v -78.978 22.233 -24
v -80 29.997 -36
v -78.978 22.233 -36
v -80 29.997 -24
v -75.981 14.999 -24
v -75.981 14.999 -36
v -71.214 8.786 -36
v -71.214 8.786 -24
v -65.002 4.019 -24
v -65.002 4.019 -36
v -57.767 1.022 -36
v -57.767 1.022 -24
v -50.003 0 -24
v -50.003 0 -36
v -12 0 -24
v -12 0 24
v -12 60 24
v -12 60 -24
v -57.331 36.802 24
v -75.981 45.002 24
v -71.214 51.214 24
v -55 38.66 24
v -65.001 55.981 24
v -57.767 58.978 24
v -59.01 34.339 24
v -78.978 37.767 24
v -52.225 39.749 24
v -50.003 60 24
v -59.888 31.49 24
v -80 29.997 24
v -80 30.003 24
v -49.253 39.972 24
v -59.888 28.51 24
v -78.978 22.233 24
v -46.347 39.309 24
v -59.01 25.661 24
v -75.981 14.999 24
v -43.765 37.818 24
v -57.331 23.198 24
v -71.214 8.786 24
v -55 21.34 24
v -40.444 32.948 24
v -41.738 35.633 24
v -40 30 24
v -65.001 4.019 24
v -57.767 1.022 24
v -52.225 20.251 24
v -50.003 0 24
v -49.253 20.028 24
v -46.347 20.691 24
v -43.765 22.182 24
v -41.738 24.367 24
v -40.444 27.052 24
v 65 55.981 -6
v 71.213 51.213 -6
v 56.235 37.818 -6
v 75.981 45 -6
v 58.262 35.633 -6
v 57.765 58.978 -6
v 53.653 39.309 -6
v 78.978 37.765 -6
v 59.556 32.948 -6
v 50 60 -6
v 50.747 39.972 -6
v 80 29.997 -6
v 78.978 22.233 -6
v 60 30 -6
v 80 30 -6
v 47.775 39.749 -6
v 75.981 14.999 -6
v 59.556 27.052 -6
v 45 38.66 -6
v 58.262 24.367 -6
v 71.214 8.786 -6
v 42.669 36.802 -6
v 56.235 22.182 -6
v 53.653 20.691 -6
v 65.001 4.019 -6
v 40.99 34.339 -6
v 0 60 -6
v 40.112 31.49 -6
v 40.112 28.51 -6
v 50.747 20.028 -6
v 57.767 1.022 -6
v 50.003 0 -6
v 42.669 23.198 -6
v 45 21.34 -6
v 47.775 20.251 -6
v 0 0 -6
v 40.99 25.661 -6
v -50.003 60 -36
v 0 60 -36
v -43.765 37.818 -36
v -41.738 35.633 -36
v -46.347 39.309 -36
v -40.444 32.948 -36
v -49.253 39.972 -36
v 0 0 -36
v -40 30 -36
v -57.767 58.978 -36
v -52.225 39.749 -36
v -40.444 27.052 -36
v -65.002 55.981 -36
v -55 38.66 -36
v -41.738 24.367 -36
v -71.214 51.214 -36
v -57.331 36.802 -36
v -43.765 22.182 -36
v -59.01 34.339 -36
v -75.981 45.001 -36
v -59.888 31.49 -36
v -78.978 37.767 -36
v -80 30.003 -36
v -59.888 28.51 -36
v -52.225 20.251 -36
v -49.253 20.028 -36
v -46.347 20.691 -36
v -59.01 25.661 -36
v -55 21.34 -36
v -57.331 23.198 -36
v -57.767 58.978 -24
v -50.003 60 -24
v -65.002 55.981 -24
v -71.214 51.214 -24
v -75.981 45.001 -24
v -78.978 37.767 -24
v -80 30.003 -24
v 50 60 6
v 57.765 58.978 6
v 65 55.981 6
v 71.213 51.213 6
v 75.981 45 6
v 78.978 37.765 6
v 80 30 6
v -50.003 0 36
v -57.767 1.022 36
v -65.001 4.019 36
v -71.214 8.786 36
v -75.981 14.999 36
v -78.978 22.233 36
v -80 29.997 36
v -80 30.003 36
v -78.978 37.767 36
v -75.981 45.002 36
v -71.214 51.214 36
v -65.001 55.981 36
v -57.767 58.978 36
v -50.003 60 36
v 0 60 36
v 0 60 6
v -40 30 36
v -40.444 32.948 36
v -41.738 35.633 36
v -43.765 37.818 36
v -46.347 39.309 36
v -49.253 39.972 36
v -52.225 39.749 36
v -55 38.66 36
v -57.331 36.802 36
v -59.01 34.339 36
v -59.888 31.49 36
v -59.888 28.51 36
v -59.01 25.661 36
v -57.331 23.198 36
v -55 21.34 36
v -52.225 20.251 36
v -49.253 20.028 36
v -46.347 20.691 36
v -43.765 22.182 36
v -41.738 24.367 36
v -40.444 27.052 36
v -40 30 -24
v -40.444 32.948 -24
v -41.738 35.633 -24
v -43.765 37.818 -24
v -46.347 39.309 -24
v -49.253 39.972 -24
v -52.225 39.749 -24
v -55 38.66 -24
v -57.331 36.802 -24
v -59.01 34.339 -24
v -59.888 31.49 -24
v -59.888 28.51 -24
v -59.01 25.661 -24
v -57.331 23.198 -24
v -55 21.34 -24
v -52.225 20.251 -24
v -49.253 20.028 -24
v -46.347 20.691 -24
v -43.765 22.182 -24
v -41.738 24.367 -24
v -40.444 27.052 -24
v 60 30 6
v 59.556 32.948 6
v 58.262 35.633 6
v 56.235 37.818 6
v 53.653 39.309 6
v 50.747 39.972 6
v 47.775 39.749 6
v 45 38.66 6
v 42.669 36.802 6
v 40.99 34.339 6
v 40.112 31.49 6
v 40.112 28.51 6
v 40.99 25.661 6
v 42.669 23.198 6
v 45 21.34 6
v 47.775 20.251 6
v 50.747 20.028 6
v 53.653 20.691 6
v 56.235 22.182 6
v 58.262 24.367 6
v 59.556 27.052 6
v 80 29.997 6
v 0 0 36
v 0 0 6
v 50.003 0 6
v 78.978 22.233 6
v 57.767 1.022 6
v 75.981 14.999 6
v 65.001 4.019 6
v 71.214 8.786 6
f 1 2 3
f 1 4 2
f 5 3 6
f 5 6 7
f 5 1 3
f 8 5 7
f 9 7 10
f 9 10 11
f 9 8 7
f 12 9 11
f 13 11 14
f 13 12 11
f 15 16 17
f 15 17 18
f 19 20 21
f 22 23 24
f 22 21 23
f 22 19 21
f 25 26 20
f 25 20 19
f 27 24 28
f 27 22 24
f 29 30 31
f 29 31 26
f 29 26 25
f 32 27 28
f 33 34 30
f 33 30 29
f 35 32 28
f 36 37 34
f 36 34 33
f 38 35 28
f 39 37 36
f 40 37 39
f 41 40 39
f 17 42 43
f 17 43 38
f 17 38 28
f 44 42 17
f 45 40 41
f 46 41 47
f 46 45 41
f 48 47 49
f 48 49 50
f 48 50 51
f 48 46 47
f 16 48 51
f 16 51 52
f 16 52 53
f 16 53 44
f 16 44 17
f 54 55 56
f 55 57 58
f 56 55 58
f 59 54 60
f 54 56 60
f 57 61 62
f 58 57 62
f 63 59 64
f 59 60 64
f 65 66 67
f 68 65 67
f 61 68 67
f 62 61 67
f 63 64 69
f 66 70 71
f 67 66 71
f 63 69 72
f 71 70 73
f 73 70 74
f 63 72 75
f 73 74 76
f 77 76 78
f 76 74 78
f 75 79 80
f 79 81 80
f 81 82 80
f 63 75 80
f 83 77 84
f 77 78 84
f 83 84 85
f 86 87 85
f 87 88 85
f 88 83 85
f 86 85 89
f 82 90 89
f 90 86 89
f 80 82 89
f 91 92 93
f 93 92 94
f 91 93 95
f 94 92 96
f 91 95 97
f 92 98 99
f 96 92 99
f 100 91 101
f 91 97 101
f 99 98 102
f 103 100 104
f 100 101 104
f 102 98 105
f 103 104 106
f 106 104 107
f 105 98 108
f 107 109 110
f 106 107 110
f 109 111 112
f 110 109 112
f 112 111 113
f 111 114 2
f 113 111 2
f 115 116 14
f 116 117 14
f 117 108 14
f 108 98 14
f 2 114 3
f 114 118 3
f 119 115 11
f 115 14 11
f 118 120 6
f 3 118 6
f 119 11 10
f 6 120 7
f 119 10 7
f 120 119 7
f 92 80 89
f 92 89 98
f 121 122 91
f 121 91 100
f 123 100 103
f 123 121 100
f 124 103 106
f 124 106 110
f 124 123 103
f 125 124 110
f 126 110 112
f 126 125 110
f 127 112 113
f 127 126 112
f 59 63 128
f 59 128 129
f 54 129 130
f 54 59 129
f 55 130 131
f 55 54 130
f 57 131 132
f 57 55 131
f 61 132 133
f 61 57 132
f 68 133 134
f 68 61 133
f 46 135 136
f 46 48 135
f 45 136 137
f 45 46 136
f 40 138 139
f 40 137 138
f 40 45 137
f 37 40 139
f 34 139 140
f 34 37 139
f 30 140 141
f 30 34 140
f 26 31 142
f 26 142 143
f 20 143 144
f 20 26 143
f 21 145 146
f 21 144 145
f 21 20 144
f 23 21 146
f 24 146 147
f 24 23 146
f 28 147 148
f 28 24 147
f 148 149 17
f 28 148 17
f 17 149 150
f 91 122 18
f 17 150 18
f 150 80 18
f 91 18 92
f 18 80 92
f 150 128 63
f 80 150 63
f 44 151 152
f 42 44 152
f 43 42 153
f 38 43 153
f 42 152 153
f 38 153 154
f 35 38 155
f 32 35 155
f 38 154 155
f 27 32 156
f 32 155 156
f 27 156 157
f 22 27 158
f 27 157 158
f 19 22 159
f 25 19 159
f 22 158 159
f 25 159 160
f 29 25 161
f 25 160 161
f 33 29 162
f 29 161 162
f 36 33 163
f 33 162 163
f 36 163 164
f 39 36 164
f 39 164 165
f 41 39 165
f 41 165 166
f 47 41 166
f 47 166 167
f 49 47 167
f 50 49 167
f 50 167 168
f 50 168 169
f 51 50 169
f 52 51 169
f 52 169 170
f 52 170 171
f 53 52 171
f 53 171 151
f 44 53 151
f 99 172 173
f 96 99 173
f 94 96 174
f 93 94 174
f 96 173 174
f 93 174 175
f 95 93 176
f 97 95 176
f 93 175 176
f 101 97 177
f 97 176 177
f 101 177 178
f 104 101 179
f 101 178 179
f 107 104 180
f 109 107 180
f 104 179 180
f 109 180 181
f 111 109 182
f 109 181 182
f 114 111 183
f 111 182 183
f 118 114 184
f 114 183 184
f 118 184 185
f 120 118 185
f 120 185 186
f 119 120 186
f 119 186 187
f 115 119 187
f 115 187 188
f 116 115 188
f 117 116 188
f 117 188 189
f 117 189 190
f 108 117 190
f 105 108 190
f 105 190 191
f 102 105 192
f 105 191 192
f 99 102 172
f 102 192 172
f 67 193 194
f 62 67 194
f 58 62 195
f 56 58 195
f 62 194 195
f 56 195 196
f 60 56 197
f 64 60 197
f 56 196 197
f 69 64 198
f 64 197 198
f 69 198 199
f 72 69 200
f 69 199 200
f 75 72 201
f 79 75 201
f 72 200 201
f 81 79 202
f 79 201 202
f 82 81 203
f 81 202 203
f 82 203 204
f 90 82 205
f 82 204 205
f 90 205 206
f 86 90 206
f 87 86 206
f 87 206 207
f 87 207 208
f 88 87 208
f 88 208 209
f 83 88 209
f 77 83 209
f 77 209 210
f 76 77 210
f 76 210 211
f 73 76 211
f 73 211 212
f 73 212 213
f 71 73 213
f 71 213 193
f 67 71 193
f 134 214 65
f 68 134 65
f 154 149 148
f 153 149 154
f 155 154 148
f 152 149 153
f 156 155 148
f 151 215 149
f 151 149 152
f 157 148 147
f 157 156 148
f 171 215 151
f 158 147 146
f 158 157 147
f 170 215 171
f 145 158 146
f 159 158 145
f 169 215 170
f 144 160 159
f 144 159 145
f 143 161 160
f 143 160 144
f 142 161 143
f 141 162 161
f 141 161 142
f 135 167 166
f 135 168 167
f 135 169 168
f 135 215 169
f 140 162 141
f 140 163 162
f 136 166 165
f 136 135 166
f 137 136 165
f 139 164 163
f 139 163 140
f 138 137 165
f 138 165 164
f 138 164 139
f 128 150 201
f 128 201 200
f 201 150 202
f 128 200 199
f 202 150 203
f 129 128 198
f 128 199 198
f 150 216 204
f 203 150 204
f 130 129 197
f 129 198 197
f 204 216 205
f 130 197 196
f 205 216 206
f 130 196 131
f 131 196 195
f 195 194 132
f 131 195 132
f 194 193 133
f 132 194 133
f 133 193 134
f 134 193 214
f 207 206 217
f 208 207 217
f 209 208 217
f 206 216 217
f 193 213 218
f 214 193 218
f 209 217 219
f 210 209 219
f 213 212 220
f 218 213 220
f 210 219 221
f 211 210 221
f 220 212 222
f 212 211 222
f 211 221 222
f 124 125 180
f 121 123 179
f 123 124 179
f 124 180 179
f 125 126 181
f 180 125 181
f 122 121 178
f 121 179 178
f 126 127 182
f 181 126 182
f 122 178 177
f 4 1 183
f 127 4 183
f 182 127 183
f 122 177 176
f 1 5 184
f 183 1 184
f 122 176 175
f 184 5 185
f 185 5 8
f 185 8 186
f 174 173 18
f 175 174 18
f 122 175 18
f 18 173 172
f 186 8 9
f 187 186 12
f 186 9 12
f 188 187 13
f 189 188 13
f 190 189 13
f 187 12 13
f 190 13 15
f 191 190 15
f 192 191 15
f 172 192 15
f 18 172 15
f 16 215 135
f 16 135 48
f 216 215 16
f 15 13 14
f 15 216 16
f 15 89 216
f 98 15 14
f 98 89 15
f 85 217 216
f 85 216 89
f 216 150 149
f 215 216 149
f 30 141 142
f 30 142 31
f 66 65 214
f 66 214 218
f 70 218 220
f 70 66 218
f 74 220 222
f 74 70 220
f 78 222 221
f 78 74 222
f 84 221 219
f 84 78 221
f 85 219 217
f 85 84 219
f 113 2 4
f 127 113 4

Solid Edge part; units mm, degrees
sketch "Sketch1" plane through (0, 0, 0) normal (0, -1, 0) x (1, 0, 0)
  line L0 (0, 36) -> (-80, 36)
  line L1 (-80, 36) -> (-80, 24)
  line L2 (-80, 24) -> (-12, 24)
  line L3 (-12, 24) -> (-12, -24)
  line L4 (-80, -24) -> (-12, -24)
  line L5 (-80, -36) -> (-80, -24)
  line L6 (0, -36) -> (-80, -36)
  line L7 (0, -6) -> (0, -36)
  line L8 (80, -6) -> (0, -6)
  line L9 (80, 6) -> (80, -6)
  line L10 (0, 6) -> (80, 6)
  line L11 (0, 6) -> (0, 36)
extrude "Protrusion1" add sketch "Sketch1" against normal blind 60
sketch "Sketch2" plane through (-40, 30, 36) normal (0, 0, 1) x (1, 0, 0)
  circle A0 centre (90, 0) radius 10
  circle A1 centre (-10, 0) radius 10
extrude "ExtrudedCutout_1" cut sketch "Sketch2" against normal blind 72
fillet "Round_2" radius 30 1 edges at (80, 60, 0)
fillet "Round_3" radius 30 5 edges at (80, 0, 0) (-80, 0, 30) (-80, 0, -30) (-80, 60, -30) (-80, 60, 30)
